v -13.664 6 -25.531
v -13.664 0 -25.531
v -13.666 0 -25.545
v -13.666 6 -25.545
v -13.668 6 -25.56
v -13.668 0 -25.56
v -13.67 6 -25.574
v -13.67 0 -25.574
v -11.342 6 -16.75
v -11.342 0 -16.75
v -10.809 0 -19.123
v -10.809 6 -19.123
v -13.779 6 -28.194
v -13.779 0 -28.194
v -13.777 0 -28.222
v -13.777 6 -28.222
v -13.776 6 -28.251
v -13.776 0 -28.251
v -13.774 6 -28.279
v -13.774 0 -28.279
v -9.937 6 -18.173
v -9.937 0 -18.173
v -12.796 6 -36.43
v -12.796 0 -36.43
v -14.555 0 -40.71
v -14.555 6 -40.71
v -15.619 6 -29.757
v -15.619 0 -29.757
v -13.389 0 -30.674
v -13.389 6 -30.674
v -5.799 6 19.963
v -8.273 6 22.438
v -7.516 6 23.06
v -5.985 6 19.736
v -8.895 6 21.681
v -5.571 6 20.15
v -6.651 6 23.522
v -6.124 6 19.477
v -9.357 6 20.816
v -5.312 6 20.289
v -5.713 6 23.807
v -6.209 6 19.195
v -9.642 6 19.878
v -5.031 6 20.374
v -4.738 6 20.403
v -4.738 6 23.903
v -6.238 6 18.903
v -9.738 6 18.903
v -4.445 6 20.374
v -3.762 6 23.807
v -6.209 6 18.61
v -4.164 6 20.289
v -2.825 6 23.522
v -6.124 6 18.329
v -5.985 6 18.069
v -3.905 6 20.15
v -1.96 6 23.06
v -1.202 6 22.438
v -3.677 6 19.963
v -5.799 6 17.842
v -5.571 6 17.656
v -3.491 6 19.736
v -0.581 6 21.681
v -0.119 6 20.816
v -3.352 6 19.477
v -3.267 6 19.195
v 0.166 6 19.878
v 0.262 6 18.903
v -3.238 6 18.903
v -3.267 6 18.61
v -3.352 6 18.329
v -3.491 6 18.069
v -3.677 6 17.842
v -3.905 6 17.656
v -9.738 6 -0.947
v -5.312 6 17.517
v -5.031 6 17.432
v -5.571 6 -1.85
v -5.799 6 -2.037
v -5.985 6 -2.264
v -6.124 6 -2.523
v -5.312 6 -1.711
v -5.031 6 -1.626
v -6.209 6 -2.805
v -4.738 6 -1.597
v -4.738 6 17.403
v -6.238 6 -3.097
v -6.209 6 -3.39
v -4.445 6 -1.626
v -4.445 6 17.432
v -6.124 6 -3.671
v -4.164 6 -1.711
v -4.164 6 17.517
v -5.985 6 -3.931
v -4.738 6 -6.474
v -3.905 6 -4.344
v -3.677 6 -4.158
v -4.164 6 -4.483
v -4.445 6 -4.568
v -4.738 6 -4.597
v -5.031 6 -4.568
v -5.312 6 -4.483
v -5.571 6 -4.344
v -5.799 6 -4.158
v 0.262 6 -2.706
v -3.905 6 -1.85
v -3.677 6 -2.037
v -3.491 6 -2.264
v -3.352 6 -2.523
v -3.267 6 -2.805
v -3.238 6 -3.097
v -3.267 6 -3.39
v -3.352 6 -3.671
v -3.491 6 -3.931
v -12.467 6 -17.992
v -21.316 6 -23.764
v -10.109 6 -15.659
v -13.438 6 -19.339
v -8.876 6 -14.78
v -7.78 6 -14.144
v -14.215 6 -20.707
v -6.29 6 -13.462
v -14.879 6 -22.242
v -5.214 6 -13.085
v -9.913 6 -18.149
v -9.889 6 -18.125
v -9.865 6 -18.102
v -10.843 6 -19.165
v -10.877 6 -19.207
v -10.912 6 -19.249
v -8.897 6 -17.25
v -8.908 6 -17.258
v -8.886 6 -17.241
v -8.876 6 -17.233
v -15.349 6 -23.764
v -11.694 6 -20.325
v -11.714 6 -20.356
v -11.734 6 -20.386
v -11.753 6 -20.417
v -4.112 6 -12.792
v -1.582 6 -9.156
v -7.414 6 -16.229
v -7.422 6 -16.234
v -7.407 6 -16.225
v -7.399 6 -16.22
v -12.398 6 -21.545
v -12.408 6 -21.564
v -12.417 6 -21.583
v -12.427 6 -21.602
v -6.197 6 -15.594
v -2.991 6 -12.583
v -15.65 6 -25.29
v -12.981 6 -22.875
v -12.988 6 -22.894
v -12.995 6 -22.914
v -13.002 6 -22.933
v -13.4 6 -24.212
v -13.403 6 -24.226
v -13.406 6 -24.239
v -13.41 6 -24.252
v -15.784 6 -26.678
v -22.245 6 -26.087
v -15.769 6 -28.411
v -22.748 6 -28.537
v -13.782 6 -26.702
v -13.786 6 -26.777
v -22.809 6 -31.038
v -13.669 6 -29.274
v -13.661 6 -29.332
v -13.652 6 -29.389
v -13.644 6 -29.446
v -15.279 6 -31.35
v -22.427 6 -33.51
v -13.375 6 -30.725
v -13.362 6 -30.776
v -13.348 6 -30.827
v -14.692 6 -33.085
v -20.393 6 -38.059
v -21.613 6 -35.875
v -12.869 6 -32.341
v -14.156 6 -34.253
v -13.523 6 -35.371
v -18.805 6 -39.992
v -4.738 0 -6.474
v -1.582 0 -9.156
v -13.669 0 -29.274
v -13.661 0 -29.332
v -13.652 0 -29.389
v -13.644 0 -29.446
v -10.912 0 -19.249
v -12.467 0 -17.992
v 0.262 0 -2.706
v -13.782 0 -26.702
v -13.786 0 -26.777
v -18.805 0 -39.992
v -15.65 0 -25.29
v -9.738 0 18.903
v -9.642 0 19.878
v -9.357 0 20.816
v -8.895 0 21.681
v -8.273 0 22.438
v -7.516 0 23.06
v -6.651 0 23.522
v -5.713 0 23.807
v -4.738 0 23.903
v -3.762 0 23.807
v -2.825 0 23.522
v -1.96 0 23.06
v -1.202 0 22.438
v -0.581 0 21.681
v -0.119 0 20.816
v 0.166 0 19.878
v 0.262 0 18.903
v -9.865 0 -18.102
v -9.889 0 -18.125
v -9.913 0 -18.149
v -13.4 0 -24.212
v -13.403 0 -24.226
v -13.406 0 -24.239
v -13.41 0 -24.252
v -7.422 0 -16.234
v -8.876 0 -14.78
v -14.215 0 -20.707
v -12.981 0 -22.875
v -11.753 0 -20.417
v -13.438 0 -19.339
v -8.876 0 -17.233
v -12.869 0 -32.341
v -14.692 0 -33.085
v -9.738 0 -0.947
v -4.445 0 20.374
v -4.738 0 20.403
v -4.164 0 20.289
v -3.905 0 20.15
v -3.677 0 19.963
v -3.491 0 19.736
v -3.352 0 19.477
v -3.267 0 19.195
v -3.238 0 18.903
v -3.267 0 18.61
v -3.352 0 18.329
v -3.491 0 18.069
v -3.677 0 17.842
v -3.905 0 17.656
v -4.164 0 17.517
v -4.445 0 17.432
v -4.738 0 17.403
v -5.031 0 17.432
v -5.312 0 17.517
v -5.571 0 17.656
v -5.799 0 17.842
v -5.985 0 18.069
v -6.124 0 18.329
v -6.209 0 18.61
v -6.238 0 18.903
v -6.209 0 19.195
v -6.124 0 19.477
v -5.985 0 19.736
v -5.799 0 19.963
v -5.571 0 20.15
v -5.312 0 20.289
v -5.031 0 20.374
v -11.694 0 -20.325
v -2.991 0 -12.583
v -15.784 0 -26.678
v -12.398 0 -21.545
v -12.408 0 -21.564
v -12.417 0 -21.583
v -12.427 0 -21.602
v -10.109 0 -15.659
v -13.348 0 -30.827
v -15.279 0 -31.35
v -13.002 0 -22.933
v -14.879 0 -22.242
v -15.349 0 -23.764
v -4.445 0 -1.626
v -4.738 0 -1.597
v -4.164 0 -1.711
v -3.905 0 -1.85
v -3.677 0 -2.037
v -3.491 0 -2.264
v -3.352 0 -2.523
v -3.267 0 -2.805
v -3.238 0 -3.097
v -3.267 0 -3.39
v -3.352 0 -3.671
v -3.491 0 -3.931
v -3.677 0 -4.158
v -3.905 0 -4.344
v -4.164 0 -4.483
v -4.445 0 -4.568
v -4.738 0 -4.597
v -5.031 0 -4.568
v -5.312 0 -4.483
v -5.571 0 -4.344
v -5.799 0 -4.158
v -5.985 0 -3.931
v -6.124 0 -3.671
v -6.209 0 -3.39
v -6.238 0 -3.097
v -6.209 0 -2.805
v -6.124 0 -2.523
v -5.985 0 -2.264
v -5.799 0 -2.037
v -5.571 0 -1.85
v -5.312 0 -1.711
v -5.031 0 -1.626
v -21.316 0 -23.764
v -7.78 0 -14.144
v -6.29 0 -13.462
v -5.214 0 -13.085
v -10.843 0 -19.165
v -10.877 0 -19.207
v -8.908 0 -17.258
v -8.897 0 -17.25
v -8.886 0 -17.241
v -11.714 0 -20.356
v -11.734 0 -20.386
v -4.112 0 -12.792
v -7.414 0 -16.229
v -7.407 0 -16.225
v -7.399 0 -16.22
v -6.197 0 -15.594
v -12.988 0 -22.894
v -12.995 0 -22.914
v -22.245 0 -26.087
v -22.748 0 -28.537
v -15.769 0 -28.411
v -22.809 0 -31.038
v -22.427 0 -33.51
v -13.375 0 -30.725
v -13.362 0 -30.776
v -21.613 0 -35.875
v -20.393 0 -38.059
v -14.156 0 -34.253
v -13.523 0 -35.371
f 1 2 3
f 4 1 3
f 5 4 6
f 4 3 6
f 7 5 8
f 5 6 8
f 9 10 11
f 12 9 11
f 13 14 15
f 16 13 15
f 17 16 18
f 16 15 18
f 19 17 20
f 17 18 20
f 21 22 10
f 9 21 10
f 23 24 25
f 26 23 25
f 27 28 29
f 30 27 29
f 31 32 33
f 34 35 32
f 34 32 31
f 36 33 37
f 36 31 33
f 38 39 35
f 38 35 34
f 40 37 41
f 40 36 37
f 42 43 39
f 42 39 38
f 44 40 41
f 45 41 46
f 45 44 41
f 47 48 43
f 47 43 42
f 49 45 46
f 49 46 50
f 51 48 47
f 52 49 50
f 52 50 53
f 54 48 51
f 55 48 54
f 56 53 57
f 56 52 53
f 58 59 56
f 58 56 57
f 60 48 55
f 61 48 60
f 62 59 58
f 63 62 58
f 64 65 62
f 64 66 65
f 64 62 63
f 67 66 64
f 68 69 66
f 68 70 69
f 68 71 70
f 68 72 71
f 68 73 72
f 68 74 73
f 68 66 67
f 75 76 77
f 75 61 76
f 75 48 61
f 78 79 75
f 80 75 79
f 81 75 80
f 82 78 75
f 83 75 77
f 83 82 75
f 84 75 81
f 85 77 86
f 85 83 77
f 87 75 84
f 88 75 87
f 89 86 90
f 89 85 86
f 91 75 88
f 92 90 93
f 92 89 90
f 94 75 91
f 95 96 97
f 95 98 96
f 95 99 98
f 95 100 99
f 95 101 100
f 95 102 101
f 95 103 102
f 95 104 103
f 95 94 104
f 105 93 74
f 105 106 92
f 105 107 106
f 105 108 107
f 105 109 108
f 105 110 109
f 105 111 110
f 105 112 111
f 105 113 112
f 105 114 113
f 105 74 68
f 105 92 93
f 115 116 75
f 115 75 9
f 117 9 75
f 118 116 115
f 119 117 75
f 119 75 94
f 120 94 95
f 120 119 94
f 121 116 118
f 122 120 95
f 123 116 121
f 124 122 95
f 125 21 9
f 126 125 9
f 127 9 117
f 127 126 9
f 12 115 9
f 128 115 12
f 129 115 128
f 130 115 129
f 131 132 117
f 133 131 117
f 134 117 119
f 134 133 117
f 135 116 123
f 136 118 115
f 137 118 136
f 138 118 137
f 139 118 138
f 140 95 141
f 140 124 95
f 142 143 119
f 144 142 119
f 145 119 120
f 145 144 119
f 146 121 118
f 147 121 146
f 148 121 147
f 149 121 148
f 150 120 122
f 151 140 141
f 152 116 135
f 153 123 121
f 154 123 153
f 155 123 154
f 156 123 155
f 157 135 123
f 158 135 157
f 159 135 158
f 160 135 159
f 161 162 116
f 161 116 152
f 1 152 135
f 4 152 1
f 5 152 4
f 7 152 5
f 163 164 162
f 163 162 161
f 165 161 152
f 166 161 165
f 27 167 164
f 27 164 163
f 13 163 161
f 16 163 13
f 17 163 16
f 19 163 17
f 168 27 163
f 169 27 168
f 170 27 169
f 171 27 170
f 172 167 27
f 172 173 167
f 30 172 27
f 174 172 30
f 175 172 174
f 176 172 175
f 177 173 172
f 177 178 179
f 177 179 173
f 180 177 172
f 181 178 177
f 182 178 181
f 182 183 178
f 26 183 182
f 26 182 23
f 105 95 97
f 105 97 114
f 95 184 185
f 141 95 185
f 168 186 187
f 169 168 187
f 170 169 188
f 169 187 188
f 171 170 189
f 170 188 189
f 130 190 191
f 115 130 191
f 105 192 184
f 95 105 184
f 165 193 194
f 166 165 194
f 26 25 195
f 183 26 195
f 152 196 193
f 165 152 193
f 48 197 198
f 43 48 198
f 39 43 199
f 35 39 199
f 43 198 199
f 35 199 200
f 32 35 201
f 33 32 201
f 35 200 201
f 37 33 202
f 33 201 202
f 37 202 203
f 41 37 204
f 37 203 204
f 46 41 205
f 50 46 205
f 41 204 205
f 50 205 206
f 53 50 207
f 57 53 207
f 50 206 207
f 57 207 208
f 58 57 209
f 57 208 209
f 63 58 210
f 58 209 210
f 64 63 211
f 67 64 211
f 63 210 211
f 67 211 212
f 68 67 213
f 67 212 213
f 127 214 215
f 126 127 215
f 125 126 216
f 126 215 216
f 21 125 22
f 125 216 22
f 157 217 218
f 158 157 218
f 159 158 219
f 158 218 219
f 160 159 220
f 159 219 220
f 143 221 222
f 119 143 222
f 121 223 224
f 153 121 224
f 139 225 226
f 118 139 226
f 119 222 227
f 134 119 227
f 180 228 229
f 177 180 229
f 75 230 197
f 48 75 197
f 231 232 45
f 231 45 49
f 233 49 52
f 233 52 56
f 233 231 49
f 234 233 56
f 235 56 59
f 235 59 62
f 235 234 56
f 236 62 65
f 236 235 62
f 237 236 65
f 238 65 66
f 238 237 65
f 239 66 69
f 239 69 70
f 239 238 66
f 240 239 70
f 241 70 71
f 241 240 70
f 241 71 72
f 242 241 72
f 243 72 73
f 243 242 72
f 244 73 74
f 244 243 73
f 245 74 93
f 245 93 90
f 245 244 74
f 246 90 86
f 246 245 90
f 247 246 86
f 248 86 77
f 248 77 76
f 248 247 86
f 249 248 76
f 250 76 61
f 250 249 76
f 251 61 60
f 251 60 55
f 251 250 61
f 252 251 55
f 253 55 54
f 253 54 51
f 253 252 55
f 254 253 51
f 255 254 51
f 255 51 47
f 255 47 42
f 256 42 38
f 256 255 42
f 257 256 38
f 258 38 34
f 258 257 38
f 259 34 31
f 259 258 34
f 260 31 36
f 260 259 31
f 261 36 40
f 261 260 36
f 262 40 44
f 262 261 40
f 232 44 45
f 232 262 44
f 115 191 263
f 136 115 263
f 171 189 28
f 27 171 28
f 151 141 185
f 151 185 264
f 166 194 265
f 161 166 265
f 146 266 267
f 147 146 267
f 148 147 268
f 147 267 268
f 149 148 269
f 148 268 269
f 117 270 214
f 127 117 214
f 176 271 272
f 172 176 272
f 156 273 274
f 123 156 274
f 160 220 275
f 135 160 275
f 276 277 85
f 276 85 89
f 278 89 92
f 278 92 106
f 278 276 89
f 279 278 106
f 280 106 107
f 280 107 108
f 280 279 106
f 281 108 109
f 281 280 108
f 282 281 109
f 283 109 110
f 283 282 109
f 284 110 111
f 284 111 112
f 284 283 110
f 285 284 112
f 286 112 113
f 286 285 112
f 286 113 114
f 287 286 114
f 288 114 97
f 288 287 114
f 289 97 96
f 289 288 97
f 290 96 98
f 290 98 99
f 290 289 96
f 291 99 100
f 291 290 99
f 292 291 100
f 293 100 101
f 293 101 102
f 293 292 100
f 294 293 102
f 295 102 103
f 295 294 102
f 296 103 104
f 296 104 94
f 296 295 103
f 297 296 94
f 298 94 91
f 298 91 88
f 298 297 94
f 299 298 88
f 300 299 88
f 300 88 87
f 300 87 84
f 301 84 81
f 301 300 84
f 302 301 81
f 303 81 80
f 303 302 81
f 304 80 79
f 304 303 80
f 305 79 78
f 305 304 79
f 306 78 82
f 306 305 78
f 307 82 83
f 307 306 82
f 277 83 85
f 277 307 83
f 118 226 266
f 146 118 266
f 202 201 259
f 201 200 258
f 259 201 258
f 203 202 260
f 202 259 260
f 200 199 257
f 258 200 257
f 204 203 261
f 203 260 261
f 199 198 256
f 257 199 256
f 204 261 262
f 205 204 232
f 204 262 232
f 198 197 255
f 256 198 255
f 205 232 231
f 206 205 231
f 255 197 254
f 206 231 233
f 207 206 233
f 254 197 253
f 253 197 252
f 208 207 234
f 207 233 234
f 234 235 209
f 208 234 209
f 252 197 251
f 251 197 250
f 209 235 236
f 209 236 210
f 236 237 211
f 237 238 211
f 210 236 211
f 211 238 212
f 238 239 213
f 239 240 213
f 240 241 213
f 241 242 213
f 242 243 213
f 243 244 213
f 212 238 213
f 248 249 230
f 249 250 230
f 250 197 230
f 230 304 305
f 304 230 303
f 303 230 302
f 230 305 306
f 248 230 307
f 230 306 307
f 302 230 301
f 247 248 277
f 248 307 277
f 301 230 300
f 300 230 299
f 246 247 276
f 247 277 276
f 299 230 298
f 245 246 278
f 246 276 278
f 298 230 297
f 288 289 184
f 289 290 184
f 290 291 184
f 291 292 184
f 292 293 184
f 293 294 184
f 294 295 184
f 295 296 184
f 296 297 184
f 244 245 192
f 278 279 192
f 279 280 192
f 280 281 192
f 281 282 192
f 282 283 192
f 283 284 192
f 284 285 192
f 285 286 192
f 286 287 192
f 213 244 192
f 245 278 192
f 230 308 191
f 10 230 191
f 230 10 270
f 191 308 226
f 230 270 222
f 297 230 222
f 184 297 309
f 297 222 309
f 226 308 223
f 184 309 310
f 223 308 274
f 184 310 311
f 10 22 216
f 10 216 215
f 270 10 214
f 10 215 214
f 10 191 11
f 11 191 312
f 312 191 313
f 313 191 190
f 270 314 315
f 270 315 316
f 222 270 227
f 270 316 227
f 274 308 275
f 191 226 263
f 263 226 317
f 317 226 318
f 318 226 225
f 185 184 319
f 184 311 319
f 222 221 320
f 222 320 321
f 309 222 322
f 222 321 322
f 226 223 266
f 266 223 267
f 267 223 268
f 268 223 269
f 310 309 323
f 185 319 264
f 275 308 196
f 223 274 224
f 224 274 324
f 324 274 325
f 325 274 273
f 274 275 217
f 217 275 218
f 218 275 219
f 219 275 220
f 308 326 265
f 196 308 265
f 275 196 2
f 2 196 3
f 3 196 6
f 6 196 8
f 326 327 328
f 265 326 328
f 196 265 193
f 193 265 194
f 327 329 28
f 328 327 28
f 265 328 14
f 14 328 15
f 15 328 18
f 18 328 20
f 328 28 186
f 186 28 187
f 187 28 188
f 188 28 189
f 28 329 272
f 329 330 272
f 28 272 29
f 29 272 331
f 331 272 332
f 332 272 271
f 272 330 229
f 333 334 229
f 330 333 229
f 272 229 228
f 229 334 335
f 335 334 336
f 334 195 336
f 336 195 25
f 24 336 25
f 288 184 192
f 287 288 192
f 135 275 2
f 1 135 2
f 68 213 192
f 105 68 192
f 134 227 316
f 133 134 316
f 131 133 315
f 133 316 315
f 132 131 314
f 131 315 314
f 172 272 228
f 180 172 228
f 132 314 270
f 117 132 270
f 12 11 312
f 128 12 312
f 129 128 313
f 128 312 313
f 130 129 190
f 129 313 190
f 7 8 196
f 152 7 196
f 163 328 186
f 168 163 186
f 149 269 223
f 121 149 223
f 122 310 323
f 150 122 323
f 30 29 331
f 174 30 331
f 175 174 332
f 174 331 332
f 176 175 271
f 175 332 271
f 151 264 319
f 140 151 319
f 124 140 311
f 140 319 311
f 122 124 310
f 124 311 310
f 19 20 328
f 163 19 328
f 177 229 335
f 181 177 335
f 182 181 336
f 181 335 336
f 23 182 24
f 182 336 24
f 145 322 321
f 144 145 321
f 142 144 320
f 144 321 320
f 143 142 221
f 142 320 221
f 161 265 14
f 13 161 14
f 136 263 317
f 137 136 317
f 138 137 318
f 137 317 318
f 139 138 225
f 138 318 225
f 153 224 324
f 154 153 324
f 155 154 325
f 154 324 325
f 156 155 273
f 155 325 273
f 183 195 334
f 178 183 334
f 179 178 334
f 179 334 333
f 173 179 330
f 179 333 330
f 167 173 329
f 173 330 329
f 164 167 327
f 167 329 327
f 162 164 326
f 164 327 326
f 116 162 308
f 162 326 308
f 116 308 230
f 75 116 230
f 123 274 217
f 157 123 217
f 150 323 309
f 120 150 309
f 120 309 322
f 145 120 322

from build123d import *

# Parameters (mm, degrees)
SKETCH_1_R      = 1.5
EXTRUDE_1_DEPTH = 6


with BuildPart() as part:
    # 草图1 → 凸台-拉伸1 (new body)
    with BuildSketch(Plane(origin=(0, 0, 0), x_dir=(1, 0, 0), z_dir=(0, 1, 0))):
        with BuildLine():
            Line((-9.737949598, 0.947255951), (-9.737949598, -18.902744049))
            ThreePointArc((-9.737949598, -18.902744049), (-4.737949598, -23.902744049), (0.262050402, -18.902744049))
            Line((0.262050402, -18.902744049), (0.262050402, 2.705554152))
            Line((0.262050402, 2.705554152), (-4.737949598, 6.473971492))
            Line((-4.737949598, 6.473971492), (-1.581691427, 9.155643094))
            Line((-1.581691427, 9.155643094), (-2.990655676, 12.582531705))
            ThreePointArc((-2.990655676, 12.582531705), (-4.665394525, 12.928054539), (-6.289924982, 13.461943142))
            Line((-6.289924982, 13.461943142), (-6.197163572, 15.594373686))
            Line((-6.197163572, 15.594373686), (-7.779733646, 14.143748571))
            Line((-7.779733646, 14.143748571), (-7.398920758, 16.220154199))
            ThreePointArc((-7.398920758, 16.220154199), (-7.410512726, 16.226988873), (-7.422097613, 16.233835543))
            Line((-7.422097613, 16.233835543), (-8.875748064, 14.780185092))
            Line((-8.875748064, 14.780185092), (-8.875748064, 17.233009419))
            ThreePointArc((-8.875748064, 17.233009419), (-8.89176269, 17.245719789), (-8.907757306, 17.25845533))
            Line((-8.907757306, 17.25845533), (-10.109322939, 15.658717321))
            Line((-10.109322939, 15.658717321), (-9.864779998, 18.101747371))
            ThreePointArc((-9.864779998, 18.101747371), (-9.900992511, 18.13709659), (-9.937067144, 18.172586506))
            Line((-9.937067144, 18.172586506), (-11.342451387, 16.749598407))
            Line((-11.342451387, 16.749598407), (-10.808718868, 19.12339663))
            ThreePointArc((-10.808718868, 19.12339663), (-10.8603358, 19.186034382), (-10.91156065, 19.248993181))
            Line((-10.91156065, 19.248993181), (-12.466866971, 17.991606109))
            Line((-12.466866971, 17.991606109), (-11.694242841, 20.325491599))
            ThreePointArc((-11.694242841, 20.325491599), (-11.723768007, 20.371016087), (-11.753102902, 20.416663414))
            Line((-11.753102902, 20.416663414), (-13.437877261, 19.338917916))
            Line((-13.437877261, 19.338917916), (-12.397936945, 21.545287297))
            ThreePointArc((-12.397936945, 21.545287297), (-12.412363311, 21.573840278), (-12.426719371, 21.602428674))
            Line((-12.426719371, 21.602428674), (-14.215127033, 20.7071086))
            Line((-14.215127033, 20.7071086), (-12.980819551, 22.874696888))
            ThreePointArc((-12.980819551, 22.874696888), (-12.991659581, 22.903835263), (-13.002429896, 22.932999479))
            Line((-13.002429896, 22.932999479), (-14.879408408, 22.242382606))
            Line((-14.879408408, 22.242382606), (-13.399650606, 24.212499539))
            ThreePointArc((-13.399650606, 24.212499539), (-13.404668281, 24.232259063), (-13.409654964, 24.25202643))
            Line((-13.409654964, 24.25202643), (-15.349283486, 23.764336781))
            Line((-15.349283486, 23.764336781), (-13.663841103, 25.531286293))
            ThreePointArc((-13.663841103, 25.531286293), (-13.666952622, 25.552575019), (-13.670028903, 25.573868865))
            Line((-13.670028903, 25.573868865), (-15.649714954, 25.28953959))
            Line((-15.649714954, 25.28953959), (-13.782119424, 26.702074649))
            Line((-13.782119424, 26.702074649), (-13.786071717, 26.777270326))
            Line((-13.786071717, 26.777270326), (-15.783610509, 26.678079738))
            Line((-15.783610509, 26.678079738), (-13.779118172, 28.19415517))
            ThreePointArc((-13.779118172, 28.19415517), (-13.776521837, 28.236618422), (-13.773786555, 28.27907295))
            Line((-13.773786555, 28.27907295), (-15.769435323, 28.41092892))
            Line((-15.769435323, 28.41092892), (-13.669425272, 29.274347437))
            ThreePointArc((-13.669425272, 29.274347437), (-13.656782501, 29.360141075), (-13.643567704, 29.445848467))
            Line((-13.643567704, 29.445848467), (-15.619182802, 29.757208362))
            Line((-15.619182802, 29.757208362), (-13.388679068, 30.674279319))
            ThreePointArc((-13.388679068, 30.674279319), (-13.368727635, 30.750538102), (-13.348314176, 30.826674507))
            Line((-13.348314176, 30.826674507), (-15.278505654, 31.350469177))
            Line((-15.278505654, 31.350469177), (-12.868620153, 32.341292896))
            Line((-12.868620153, 32.341292896), (-14.692134653, 33.084702139))
            ThreePointArc((-14.692134653, 33.084702139), (-13.851601264, 34.818611239), (-12.795725249, 36.430462034))
            Line((-12.795725249, 36.430462034), (-14.555144967, 40.70972987))
            Line((-14.555144967, 40.70972987), (-18.80498844, 39.992143324))
            ThreePointArc((-18.80498844, 39.992143324), (-22.673158885, 32.282486217), (-21.315703366, 23.764336781))
            Line((-21.315703366, 23.764336781), (-9.737949598, 0.947255951))
        make_face()
        with Locations(Location((-4.737949598, -18.902744049, 0), (0, 0, 270))):
            Circle(SKETCH_1_R, mode=Mode.SUBTRACT)
        with Locations(Location((-4.737949598, 3.097255951, 0), (0, 0, 270))):
            Circle(SKETCH_1_R, mode=Mode.SUBTRACT)
    extrude(amount=EXTRUDE_1_DEPTH)


solid = part.part
